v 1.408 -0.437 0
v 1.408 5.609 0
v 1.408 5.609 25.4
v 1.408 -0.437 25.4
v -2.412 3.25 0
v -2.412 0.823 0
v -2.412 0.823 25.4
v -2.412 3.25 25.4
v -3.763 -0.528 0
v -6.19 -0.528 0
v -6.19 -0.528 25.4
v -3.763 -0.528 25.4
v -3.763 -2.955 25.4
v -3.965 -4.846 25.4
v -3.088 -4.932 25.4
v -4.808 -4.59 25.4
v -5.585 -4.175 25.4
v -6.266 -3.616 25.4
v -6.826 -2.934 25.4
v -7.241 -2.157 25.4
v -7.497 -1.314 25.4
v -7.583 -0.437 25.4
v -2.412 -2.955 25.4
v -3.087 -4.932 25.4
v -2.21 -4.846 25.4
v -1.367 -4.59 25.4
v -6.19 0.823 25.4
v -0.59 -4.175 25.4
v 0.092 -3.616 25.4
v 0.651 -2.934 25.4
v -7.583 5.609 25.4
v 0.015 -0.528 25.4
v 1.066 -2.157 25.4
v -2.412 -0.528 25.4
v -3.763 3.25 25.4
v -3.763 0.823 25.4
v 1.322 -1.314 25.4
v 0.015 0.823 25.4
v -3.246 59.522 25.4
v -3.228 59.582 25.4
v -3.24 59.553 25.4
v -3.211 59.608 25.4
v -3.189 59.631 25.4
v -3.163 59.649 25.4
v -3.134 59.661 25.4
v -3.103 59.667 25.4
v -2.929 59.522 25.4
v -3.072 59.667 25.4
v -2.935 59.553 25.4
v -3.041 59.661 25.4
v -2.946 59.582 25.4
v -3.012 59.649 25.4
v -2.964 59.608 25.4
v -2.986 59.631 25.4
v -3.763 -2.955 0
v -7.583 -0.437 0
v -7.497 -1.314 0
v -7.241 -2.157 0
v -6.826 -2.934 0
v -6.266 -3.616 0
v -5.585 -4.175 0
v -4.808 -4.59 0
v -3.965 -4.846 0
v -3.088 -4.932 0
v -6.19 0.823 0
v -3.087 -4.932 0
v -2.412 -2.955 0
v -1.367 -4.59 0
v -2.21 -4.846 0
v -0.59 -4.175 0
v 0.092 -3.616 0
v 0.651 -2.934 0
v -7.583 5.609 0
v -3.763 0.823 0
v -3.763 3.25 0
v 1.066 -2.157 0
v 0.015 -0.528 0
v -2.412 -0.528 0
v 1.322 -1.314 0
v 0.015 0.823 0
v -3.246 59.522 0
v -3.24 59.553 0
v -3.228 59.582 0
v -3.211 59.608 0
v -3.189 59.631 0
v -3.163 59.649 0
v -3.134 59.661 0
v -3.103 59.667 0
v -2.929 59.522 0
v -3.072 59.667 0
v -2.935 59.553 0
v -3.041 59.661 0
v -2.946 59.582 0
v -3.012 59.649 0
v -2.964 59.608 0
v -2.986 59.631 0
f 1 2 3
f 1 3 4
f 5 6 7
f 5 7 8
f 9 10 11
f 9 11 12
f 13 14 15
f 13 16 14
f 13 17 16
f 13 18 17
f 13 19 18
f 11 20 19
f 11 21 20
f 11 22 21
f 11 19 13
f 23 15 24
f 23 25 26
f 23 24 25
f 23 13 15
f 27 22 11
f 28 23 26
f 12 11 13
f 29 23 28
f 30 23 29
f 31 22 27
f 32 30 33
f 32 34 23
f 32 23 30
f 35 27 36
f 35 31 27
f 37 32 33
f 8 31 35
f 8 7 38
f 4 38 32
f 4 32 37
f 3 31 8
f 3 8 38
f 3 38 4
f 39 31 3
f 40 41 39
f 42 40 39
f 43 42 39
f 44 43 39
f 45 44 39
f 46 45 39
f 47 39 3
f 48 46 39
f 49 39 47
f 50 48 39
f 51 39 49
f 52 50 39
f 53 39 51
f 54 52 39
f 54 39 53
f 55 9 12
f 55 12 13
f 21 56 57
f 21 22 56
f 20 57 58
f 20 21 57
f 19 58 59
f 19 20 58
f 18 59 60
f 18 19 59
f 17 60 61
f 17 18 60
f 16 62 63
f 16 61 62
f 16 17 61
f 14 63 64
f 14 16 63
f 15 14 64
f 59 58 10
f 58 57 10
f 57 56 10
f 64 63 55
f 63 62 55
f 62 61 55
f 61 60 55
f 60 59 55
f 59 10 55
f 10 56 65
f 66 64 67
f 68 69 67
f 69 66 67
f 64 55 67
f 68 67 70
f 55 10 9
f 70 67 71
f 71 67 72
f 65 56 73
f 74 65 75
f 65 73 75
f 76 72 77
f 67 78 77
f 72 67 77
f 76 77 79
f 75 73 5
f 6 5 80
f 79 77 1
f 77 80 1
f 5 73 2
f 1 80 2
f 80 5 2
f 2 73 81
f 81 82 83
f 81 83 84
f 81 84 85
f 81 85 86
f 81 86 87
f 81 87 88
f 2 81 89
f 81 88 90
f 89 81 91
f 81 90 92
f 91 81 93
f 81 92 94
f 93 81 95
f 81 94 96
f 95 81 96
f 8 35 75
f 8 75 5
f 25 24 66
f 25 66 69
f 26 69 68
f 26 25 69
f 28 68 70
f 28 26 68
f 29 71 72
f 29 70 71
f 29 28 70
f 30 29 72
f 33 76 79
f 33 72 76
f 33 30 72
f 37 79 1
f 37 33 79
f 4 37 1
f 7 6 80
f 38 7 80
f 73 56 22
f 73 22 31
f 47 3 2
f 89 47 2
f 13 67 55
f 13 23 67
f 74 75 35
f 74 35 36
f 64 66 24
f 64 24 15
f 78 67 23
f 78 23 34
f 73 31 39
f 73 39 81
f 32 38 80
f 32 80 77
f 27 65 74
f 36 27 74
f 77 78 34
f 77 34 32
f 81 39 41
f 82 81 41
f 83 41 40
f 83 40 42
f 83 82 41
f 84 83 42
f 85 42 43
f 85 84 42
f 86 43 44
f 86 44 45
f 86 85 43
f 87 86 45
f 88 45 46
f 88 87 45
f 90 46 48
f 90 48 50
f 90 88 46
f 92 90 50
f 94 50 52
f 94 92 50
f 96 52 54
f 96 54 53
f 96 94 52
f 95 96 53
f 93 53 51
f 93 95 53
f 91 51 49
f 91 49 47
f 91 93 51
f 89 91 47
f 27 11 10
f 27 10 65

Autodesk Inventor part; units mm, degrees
ref_plane "YZ Plane" through (0, 0, 0) normal (1, 0, 0) x (0, 1, 0)
ref_plane "XZ Plane" through (0, 0, 0) normal (0, 1, 0) x (-1, 0, 0)
ref_plane "XY Plane" through (0, 0, 0) normal (0, 0, 1) x (1, 0, 0)
sketch "Sketch1" plane through (0, 0, 0) normal (0, 0, 1) x (1, 0, 0)
  line L0 (-7.5832, 61.4886) -> (1.4084, 61.4886)
  line L1 (1.4084, 61.4886) -> (1.4084, -4.9324)
  line L2 (1.4084, -4.9324) -> (-7.5832, -4.9324)
  line L3 (-7.5832, -4.9324) -> (-7.5832, 61.4886)
  point P0 (0, 0)
  dimension "d0" = 8.9916
  dimension "d1" = 66.421
extrude "Extrusion1" add sketch "Sketch1" along normal blind 25.4
sketch "Sketch2" plane through (0, 0, 25.4) normal (0, 0, 1) x (1, 0, 0)
  line L0 (-7.5832, -4.9324) -> (1.4084, -4.9324) projected
  line L1 (-3.0874, -4.9324) -> (-3.0874, 0.1476) construction
  circle A0 centre (-3.0874, 0.1476) radius 3.175 construction
  line L2 (-3.0874, 0.1476) -> (-3.7626, 3.25) construction
  line L3 (-3.0874, 0.1476) -> (-2.4123, 3.25) construction
  line L4 (-3.7626, 3.25) -> (-2.4123, 3.25)
  line L5 (-3.0874, 0.1476) -> (-6.1898, -0.5275) construction
  line L6 (-6.1898, -0.5275) -> (-6.1898, 0.8228)
  line L7 (-3.0874, 0.1476) -> (-2.4123, -2.9547) construction
  line L8 (-2.4123, -2.9547) -> (-3.7626, -2.9547)
  line L9 (-3.0874, 0.1476) -> (0.0149, 0.8228) construction
  line L10 (0.0149, 0.8228) -> (0.0149, -0.5275)
  line L11 (-3.7626, 3.25) -> (-3.7626, 0.8228)
  line L12 (-3.7626, -0.5275) -> (-3.7626, -2.9547)
  line L13 (-6.1898, -0.5275) -> (-3.7626, -0.5275)
  line L14 (-2.4123, -0.5275) -> (0.0149, -0.5275)
  line L15 (-2.4123, -2.9547) -> (-2.4123, -0.5275)
  line L16 (-2.4123, 0.8228) -> (-2.4123, 3.25)
  line L17 (-2.4123, 0.8228) -> (0.0149, 0.8228)
  line L18 (-6.1898, 0.8228) -> (-3.7626, 0.8228)
  point P0 (0, 0)
  dimension "d4" = 5.08
  dimension "d5" = 6.35
  dimension "d18" = 360
fillet "Fillet1" radius 4.4958 2 edges at (1.4084, -4.9324, 12.7) (-7.5832, -4.9324, 12.7)
chamfer "Chamfer1" distance 4.4958 distance2 55.88 1 edges at (-7.5832, 61.4886, 12.7) measured on face at (-1.5888, 61.4886, 8.4667)
chamfer "Chamfer2" distance 55.88 distance2 4.4958 1 edges at (1.4084, 61.4886, 12.7) measured on face at (1.4084, 20.2051, 8.4667)
sketch "Sketch3" plane through (0, 0, 25.4) normal (0, 0, 1) x (1, 0, 0)
  point P0 (0, 0)
fillet "Fillet2" radius 0.1588 2 edges at (-3.0873, 61.4886, 12.7) (-3.0874, 61.4886, 12.7)
extrude "Extrusion3" cut sketch "Sketch2" against normal blind 25.4
sketch "Sketch4" plane through (0, 0, 25.4) normal (0, 0, 1) x (1, 0, 0)
  line L0 (-6.1898, 0.8228) -> (-6.1898, -0.5275) projected
  line L1 (-6.1898, 0.1476) -> (-2.5733, 0.1476) construction
  circle A0 centre (-3.0874, 0.1476) radius 0.9548
  point P0 (0, 0)
properties part number "Bistable Flipper"
